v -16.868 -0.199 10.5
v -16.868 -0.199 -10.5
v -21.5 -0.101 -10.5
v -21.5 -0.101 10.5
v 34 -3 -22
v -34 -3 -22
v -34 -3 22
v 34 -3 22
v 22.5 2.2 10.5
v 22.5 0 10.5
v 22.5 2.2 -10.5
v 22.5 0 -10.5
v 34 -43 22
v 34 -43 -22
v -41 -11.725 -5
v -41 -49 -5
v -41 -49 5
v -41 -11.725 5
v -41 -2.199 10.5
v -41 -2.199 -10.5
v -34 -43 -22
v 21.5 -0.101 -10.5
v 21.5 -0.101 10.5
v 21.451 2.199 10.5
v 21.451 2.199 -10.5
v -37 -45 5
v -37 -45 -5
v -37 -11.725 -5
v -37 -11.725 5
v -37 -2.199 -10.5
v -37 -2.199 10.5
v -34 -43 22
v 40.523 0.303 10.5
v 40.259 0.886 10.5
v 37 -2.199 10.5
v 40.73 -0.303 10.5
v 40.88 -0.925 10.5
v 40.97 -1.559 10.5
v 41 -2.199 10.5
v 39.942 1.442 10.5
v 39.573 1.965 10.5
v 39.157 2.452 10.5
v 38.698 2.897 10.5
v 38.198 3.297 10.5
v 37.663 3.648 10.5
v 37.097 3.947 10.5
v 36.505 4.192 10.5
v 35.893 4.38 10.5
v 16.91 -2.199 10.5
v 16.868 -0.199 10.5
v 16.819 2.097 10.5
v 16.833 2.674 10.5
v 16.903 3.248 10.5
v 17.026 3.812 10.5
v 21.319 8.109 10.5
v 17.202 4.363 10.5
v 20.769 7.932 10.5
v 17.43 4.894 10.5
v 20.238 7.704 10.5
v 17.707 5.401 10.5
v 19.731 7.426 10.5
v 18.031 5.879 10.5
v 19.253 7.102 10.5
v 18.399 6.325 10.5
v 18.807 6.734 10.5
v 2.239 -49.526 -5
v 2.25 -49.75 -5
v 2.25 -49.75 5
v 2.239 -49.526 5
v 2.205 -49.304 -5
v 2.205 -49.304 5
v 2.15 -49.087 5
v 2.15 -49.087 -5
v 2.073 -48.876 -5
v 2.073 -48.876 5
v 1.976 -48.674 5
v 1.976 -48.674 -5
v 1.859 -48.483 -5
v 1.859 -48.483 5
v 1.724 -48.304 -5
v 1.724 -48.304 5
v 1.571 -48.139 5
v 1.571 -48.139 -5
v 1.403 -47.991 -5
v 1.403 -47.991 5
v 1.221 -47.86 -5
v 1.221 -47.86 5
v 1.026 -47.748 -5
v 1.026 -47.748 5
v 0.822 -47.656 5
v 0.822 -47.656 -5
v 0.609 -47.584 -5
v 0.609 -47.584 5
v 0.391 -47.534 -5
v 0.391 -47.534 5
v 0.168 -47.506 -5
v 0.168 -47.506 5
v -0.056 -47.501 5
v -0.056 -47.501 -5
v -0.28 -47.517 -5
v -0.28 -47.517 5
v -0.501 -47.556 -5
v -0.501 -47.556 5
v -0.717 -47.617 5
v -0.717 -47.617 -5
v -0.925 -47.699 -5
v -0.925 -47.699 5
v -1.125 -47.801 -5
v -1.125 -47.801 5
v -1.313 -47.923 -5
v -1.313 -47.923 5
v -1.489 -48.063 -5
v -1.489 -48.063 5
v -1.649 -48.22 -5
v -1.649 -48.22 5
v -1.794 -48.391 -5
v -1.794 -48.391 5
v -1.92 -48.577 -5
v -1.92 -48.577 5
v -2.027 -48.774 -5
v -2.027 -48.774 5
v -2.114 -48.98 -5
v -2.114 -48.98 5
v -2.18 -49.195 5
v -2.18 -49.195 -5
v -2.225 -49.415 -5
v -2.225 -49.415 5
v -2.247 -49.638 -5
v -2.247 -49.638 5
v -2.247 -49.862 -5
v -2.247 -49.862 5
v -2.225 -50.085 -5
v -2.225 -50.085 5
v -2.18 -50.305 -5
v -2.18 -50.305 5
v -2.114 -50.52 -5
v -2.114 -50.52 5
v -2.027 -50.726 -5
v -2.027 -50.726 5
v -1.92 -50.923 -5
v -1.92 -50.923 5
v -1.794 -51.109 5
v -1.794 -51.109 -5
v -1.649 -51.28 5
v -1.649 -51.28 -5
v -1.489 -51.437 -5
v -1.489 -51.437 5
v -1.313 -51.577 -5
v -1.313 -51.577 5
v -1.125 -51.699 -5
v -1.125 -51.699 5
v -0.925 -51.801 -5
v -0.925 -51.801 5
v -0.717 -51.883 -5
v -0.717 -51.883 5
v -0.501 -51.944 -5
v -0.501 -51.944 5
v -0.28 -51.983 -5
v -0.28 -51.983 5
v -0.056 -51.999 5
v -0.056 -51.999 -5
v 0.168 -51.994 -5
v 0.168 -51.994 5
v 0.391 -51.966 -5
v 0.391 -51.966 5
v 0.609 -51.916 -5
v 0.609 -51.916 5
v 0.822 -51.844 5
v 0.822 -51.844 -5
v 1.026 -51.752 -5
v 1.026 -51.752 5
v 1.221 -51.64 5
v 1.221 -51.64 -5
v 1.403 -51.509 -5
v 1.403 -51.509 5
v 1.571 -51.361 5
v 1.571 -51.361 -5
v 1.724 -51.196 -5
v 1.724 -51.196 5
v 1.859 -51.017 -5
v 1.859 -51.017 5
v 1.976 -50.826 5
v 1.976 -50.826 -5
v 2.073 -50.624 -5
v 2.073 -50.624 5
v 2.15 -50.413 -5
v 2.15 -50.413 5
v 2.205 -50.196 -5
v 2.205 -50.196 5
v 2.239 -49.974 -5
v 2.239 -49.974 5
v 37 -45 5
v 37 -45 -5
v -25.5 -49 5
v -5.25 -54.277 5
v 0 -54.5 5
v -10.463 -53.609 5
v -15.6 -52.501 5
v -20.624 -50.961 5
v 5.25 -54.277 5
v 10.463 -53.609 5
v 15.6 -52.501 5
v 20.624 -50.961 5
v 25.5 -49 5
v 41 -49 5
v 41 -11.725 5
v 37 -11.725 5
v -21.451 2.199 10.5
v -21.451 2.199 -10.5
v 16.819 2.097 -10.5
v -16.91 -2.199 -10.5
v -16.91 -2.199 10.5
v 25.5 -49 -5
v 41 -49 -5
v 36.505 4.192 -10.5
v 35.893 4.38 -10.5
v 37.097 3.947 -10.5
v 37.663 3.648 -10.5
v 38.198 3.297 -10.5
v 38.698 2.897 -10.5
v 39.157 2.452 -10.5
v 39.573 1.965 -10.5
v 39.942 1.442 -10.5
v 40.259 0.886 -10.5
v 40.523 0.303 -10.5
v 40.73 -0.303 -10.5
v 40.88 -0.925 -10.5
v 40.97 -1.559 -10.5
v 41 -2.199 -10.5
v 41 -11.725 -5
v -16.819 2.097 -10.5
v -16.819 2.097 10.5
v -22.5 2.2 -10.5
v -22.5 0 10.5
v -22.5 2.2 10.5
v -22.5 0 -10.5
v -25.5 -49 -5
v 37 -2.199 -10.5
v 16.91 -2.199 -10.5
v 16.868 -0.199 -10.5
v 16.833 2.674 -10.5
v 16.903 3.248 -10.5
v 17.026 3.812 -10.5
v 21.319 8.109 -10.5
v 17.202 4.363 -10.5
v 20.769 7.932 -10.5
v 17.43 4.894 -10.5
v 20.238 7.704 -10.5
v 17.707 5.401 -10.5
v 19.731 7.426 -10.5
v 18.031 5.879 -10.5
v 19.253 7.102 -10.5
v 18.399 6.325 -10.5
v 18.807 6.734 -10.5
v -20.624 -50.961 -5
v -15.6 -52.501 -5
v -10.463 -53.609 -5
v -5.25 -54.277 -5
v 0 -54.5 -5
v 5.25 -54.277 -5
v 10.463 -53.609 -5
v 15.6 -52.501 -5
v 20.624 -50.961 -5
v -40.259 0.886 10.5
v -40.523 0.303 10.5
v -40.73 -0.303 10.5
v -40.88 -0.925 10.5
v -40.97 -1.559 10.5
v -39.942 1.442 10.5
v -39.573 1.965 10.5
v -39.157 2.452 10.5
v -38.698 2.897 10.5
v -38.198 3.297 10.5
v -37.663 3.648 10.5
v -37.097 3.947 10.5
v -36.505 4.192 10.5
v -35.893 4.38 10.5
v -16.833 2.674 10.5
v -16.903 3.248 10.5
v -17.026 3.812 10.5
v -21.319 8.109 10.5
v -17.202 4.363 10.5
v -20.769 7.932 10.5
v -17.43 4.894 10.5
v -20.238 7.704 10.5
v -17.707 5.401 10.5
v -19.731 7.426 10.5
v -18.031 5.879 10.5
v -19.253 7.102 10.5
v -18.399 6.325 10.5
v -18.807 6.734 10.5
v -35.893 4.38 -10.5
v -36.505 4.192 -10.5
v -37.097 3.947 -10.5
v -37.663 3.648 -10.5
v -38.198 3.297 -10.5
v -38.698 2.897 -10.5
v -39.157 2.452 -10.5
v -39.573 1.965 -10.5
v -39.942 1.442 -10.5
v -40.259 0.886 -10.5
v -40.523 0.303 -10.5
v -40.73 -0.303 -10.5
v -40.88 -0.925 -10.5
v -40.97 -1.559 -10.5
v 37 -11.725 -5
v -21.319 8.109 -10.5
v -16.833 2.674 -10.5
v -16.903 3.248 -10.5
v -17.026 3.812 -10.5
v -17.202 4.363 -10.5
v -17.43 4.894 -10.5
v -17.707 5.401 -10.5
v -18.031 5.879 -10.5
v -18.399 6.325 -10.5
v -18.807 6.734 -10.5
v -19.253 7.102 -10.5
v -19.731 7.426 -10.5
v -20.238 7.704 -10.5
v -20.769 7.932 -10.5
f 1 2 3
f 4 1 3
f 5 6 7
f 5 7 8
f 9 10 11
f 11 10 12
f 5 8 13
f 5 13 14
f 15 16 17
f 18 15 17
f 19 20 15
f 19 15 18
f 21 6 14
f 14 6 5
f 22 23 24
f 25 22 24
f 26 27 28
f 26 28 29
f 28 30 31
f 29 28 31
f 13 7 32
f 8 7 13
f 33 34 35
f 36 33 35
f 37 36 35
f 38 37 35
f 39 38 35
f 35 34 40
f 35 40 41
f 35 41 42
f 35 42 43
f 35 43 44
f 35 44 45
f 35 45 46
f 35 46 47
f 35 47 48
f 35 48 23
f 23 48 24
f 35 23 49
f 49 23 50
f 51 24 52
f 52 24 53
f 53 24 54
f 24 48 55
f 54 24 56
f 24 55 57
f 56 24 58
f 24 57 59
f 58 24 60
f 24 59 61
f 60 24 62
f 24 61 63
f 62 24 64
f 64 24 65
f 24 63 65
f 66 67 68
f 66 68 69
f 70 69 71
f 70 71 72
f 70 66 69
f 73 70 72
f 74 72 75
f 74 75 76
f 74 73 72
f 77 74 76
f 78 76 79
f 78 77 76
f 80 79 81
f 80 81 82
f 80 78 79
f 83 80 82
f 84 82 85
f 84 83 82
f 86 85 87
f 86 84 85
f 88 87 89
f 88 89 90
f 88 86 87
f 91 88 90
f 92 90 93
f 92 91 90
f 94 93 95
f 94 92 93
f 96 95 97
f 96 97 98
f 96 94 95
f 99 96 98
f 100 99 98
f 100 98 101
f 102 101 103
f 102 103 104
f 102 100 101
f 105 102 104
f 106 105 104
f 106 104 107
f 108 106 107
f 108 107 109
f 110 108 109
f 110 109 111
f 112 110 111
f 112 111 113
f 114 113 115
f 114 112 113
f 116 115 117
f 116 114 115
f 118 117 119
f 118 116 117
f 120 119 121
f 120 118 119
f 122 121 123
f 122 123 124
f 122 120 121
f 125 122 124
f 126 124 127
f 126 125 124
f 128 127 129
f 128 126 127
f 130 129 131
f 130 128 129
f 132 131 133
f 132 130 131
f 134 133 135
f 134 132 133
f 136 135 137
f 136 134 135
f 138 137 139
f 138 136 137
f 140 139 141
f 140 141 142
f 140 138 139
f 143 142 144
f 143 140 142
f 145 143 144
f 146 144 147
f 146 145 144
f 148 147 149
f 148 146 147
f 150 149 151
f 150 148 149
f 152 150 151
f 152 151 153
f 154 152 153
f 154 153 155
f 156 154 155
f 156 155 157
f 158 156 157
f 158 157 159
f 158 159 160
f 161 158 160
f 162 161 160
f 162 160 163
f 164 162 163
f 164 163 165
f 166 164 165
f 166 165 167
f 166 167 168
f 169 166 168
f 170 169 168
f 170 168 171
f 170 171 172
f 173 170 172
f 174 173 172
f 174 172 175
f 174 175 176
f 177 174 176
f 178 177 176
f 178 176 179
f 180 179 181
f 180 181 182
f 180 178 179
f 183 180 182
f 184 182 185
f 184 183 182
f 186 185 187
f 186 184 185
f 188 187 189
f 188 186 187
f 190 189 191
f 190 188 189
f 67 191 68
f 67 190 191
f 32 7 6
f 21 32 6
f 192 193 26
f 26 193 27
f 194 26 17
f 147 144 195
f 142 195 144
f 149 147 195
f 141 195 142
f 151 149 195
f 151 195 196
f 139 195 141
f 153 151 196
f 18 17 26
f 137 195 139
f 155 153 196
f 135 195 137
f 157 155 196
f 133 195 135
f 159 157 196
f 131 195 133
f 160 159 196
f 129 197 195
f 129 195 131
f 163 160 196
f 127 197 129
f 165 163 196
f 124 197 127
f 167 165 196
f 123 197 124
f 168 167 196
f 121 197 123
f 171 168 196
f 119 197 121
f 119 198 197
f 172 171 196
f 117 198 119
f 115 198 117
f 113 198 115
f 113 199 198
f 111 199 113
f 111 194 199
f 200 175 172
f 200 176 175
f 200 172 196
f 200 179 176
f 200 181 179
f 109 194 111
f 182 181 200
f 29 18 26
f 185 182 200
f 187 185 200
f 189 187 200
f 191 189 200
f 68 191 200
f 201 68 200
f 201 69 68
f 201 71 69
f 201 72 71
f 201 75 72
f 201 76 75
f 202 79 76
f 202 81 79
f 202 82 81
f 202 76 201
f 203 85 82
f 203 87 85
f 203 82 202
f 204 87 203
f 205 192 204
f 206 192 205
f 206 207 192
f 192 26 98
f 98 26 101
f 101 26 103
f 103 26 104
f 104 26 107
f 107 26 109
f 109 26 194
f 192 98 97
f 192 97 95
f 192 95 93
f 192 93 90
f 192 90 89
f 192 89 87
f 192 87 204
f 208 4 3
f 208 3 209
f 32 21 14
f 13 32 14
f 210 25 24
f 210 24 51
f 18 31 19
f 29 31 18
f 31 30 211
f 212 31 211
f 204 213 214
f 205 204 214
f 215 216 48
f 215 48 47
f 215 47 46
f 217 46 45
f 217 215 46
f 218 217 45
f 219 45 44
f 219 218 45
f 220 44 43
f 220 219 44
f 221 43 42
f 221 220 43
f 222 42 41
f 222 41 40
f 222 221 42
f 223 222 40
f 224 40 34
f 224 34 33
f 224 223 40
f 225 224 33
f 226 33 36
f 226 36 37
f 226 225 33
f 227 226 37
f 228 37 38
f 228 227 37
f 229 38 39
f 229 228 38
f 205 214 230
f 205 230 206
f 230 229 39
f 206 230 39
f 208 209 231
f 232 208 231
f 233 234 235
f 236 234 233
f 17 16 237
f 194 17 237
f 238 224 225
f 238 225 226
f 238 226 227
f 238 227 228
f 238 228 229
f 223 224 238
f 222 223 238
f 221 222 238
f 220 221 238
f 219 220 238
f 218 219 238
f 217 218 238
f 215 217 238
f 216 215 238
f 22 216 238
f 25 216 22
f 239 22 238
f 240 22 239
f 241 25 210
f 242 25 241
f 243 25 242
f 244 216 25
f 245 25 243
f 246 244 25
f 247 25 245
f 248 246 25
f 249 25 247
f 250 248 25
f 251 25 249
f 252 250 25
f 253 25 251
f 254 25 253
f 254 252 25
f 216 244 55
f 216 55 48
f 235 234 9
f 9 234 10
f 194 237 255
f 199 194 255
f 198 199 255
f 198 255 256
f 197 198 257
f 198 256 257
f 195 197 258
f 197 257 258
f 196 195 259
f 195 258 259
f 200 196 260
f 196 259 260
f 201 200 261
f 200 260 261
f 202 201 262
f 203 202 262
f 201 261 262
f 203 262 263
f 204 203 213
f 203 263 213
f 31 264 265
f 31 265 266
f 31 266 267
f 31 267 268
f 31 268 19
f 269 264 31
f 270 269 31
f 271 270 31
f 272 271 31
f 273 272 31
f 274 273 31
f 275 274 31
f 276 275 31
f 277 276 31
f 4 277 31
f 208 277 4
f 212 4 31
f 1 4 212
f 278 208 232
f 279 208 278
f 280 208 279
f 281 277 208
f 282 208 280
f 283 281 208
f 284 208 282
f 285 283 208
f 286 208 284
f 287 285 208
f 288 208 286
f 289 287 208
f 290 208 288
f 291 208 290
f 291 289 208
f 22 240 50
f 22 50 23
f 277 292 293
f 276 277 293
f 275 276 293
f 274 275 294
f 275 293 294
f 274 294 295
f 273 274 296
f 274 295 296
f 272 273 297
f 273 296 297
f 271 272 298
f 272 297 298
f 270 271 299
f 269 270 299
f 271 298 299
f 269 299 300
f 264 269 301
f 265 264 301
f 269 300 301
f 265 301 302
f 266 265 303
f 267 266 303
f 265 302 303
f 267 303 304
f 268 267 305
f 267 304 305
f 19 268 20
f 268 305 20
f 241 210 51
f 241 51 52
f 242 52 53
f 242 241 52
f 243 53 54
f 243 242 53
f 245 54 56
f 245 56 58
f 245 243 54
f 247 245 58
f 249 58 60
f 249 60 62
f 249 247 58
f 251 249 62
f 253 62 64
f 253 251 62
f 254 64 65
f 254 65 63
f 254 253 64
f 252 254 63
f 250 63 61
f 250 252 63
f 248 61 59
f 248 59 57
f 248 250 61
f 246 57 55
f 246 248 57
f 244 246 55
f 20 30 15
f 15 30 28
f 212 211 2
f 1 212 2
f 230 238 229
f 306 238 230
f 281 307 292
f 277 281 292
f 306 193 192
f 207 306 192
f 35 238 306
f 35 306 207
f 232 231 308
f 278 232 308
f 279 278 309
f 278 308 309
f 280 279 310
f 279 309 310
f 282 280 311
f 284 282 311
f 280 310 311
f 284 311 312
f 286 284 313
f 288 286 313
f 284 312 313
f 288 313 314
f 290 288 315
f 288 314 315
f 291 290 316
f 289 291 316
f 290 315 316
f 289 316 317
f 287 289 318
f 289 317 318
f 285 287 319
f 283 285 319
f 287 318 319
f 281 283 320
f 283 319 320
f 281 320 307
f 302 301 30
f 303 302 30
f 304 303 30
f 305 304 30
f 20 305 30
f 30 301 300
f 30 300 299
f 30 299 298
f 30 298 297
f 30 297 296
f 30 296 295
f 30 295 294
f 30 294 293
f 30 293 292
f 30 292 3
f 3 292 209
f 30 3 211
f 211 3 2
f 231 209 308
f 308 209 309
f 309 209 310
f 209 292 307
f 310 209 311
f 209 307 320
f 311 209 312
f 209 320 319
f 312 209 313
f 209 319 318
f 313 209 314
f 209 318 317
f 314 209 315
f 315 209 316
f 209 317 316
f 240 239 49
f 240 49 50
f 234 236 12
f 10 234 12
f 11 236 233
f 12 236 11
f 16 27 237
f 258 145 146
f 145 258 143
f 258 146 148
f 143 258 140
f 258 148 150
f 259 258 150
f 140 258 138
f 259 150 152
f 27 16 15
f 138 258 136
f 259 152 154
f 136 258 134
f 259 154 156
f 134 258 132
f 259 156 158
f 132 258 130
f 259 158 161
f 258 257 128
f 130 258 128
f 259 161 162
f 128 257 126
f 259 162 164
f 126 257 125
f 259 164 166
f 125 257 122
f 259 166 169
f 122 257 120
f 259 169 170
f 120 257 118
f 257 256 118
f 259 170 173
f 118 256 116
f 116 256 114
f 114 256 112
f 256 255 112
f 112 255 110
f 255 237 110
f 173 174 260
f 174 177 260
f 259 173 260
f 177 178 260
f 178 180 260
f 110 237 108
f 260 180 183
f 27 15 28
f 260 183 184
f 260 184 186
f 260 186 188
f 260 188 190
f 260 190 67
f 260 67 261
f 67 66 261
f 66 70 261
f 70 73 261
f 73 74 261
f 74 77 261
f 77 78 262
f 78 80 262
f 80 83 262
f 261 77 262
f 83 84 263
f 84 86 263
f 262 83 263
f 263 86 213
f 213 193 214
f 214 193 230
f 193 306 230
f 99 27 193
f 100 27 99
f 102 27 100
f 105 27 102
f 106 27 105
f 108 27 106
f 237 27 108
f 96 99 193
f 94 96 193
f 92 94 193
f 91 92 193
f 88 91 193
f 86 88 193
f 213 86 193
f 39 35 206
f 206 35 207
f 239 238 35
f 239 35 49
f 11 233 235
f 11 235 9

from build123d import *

# Parameters (mm, degrees)
SKETCH1_W                = 45
SKETCH1_H                = 21
BOSS_EXTRUDE1_DEPTH      = 2.2
SKETCH2_W                = 68
SKETCH2_H                = 44
BOSS_EXTRUDE2_DEPTH      = 40
BOSS_EXTRUDE3_DEPTH      = 5
BOSS_EXTRUDE3_DEPTH_BACK = 5
SKETCH4_R                = 2.25
BOSS_EXTRUDE4_DEPTH      = 10.5
BOSS_EXTRUDE4_DEPTH_BACK = 10.5
BOSS_EXTRUDE5_START      = -4
BOSS_EXTRUDE5_DEPTH      = 4


with BuildPart() as part:
    # Sketch1 → Boss-Extrude1 (new body)
    with BuildSketch(Plane(origin=(0, 0, 0), x_dir=(1, 0, 0), z_dir=(0, 1, 0))):
        Rectangle(SKETCH1_W, SKETCH1_H)
    extrude(amount=BOSS_EXTRUDE1_DEPTH)


with BuildPart() as body_2:
    # Sketch2 → Boss-Extrude2 (new body)
    with BuildSketch(Plane(origin=(0, -3, 0), x_dir=(1, 0, 0), z_dir=(0, 1, 0))):
        Rectangle(SKETCH2_W, SKETCH2_H)
    extrude(amount=-BOSS_EXTRUDE2_DEPTH)


with BuildPart() as body_3:
    # Sketch4 → Boss-Extrude3 (new, two sides: drawn at the far end of the back side and taken through both)
    with BuildSketch(Plane.XY.offset(-BOSS_EXTRUDE3_DEPTH_BACK)):
        with BuildLine():
            Line((37, -45), (-37, -45))
            Line((-37, -45), (-37, -2.198533967))
            Line((-37, -2.198533967), (-41, -2.198533967))
            Line((-41, -2.198533967), (-41, -49))
            Line((-41, -49), (-25.5, -49))
            ThreePointArc((-25.5, -49), (0, -54.5), (25.5, -49))
            Line((25.5, -49), (41, -49))
            Line((41, -49), (41, -2.198533967))
            Line((41, -2.198533967), (37, -2.198533967))
            Line((37, -2.198533967), (37, -45))
        make_face()
        with Locations((0, -49.75)):
            Circle(SKETCH4_R, mode=Mode.SUBTRACT)
    extrude(amount=BOSS_EXTRUDE3_DEPTH + BOSS_EXTRUDE3_DEPTH_BACK)

    # Sketch4<4> → Boss-Extrude4 (add, two sides: drawn at the far end of the back side and taken through both)
    with BuildSketch(Plane.XY.offset(-BOSS_EXTRUDE4_DEPTH_BACK)):
        with BuildLine():
            Line((21.318810043, 8.109109109), (35.893105207, 4.379706241))
            ThreePointArc((35.893105207, 4.379706241), (39.5734178, 1.965407035), (41, -2.198533967))
            Line((41, -2.198533967), (37, -2.198533967))
            Line((37, -2.198533967), (16.910081087, -2.198533967))
            Line((16.910081087, -2.198533967), (16.867589097, -0.19898541))
            Line((16.867589097, -0.19898541), (21.5, -0.100543009))
            Line((21.5, -0.100543009), (21.451123178, 2.199456991))
            Line((21.451123178, 2.199456991), (16.818810043, 2.096516699))
            ThreePointArc((16.818810043, 2.096516699), (18.031155865, 5.879423637), (21.318810043, 8.109109109))
        make_face()
        with BuildLine():
            Line((-21.318810043, 8.109109109), (-35.893105207, 4.379706241))
            ThreePointArc((-35.893105207, 4.379706241), (-39.5734178, 1.965407035), (-41, -2.198533967))
            Line((-41, -2.198533967), (-37, -2.198533967))
            Line((-37, -2.198533967), (-16.910081087, -2.198533967))
            Line((-16.910081087, -2.198533967), (-16.867589097, -0.19898541))
            Line((-16.867589097, -0.19898541), (-21.5, -0.100543009))
            Line((-21.5, -0.100543009), (-21.451123178, 2.199456991))
            Line((-21.451123178, 2.199456991), (-16.818810043, 2.096516699))
            ThreePointArc((-16.818810043, 2.096516699), (-18.031155865, 5.879423637), (-21.318810043, 8.109109109))
        make_face()
    extrude(amount=BOSS_EXTRUDE4_DEPTH + BOSS_EXTRUDE4_DEPTH_BACK)

    # Sketch6 → Boss-Extrude5 (add)
    with BuildSketch(Plane(origin=(41, 0, 0), x_dir=(0, 0, -1), z_dir=(1, 0, 0)).offset(BOSS_EXTRUDE5_START)):
        Polygon((10.5, -2.198533967), (5, -11.724813409), (5, -2.198533967), align=None)
        Polygon((-5, -11.724813409), (-5, -2.198533967), (-10.5, -2.198533967), align=None)
    boss_extrude5 = extrude(amount=BOSS_EXTRUDE5_DEPTH)

    # Mirror1: Boss-Extrude5 across plane
    add(boss_extrude5.mirror(Plane(origin=(0, 0, 0), x_dir=(0, 0, 1), z_dir=(1, 0, 0))))


solid = Compound([part.part, body_2.part, body_3.part])
